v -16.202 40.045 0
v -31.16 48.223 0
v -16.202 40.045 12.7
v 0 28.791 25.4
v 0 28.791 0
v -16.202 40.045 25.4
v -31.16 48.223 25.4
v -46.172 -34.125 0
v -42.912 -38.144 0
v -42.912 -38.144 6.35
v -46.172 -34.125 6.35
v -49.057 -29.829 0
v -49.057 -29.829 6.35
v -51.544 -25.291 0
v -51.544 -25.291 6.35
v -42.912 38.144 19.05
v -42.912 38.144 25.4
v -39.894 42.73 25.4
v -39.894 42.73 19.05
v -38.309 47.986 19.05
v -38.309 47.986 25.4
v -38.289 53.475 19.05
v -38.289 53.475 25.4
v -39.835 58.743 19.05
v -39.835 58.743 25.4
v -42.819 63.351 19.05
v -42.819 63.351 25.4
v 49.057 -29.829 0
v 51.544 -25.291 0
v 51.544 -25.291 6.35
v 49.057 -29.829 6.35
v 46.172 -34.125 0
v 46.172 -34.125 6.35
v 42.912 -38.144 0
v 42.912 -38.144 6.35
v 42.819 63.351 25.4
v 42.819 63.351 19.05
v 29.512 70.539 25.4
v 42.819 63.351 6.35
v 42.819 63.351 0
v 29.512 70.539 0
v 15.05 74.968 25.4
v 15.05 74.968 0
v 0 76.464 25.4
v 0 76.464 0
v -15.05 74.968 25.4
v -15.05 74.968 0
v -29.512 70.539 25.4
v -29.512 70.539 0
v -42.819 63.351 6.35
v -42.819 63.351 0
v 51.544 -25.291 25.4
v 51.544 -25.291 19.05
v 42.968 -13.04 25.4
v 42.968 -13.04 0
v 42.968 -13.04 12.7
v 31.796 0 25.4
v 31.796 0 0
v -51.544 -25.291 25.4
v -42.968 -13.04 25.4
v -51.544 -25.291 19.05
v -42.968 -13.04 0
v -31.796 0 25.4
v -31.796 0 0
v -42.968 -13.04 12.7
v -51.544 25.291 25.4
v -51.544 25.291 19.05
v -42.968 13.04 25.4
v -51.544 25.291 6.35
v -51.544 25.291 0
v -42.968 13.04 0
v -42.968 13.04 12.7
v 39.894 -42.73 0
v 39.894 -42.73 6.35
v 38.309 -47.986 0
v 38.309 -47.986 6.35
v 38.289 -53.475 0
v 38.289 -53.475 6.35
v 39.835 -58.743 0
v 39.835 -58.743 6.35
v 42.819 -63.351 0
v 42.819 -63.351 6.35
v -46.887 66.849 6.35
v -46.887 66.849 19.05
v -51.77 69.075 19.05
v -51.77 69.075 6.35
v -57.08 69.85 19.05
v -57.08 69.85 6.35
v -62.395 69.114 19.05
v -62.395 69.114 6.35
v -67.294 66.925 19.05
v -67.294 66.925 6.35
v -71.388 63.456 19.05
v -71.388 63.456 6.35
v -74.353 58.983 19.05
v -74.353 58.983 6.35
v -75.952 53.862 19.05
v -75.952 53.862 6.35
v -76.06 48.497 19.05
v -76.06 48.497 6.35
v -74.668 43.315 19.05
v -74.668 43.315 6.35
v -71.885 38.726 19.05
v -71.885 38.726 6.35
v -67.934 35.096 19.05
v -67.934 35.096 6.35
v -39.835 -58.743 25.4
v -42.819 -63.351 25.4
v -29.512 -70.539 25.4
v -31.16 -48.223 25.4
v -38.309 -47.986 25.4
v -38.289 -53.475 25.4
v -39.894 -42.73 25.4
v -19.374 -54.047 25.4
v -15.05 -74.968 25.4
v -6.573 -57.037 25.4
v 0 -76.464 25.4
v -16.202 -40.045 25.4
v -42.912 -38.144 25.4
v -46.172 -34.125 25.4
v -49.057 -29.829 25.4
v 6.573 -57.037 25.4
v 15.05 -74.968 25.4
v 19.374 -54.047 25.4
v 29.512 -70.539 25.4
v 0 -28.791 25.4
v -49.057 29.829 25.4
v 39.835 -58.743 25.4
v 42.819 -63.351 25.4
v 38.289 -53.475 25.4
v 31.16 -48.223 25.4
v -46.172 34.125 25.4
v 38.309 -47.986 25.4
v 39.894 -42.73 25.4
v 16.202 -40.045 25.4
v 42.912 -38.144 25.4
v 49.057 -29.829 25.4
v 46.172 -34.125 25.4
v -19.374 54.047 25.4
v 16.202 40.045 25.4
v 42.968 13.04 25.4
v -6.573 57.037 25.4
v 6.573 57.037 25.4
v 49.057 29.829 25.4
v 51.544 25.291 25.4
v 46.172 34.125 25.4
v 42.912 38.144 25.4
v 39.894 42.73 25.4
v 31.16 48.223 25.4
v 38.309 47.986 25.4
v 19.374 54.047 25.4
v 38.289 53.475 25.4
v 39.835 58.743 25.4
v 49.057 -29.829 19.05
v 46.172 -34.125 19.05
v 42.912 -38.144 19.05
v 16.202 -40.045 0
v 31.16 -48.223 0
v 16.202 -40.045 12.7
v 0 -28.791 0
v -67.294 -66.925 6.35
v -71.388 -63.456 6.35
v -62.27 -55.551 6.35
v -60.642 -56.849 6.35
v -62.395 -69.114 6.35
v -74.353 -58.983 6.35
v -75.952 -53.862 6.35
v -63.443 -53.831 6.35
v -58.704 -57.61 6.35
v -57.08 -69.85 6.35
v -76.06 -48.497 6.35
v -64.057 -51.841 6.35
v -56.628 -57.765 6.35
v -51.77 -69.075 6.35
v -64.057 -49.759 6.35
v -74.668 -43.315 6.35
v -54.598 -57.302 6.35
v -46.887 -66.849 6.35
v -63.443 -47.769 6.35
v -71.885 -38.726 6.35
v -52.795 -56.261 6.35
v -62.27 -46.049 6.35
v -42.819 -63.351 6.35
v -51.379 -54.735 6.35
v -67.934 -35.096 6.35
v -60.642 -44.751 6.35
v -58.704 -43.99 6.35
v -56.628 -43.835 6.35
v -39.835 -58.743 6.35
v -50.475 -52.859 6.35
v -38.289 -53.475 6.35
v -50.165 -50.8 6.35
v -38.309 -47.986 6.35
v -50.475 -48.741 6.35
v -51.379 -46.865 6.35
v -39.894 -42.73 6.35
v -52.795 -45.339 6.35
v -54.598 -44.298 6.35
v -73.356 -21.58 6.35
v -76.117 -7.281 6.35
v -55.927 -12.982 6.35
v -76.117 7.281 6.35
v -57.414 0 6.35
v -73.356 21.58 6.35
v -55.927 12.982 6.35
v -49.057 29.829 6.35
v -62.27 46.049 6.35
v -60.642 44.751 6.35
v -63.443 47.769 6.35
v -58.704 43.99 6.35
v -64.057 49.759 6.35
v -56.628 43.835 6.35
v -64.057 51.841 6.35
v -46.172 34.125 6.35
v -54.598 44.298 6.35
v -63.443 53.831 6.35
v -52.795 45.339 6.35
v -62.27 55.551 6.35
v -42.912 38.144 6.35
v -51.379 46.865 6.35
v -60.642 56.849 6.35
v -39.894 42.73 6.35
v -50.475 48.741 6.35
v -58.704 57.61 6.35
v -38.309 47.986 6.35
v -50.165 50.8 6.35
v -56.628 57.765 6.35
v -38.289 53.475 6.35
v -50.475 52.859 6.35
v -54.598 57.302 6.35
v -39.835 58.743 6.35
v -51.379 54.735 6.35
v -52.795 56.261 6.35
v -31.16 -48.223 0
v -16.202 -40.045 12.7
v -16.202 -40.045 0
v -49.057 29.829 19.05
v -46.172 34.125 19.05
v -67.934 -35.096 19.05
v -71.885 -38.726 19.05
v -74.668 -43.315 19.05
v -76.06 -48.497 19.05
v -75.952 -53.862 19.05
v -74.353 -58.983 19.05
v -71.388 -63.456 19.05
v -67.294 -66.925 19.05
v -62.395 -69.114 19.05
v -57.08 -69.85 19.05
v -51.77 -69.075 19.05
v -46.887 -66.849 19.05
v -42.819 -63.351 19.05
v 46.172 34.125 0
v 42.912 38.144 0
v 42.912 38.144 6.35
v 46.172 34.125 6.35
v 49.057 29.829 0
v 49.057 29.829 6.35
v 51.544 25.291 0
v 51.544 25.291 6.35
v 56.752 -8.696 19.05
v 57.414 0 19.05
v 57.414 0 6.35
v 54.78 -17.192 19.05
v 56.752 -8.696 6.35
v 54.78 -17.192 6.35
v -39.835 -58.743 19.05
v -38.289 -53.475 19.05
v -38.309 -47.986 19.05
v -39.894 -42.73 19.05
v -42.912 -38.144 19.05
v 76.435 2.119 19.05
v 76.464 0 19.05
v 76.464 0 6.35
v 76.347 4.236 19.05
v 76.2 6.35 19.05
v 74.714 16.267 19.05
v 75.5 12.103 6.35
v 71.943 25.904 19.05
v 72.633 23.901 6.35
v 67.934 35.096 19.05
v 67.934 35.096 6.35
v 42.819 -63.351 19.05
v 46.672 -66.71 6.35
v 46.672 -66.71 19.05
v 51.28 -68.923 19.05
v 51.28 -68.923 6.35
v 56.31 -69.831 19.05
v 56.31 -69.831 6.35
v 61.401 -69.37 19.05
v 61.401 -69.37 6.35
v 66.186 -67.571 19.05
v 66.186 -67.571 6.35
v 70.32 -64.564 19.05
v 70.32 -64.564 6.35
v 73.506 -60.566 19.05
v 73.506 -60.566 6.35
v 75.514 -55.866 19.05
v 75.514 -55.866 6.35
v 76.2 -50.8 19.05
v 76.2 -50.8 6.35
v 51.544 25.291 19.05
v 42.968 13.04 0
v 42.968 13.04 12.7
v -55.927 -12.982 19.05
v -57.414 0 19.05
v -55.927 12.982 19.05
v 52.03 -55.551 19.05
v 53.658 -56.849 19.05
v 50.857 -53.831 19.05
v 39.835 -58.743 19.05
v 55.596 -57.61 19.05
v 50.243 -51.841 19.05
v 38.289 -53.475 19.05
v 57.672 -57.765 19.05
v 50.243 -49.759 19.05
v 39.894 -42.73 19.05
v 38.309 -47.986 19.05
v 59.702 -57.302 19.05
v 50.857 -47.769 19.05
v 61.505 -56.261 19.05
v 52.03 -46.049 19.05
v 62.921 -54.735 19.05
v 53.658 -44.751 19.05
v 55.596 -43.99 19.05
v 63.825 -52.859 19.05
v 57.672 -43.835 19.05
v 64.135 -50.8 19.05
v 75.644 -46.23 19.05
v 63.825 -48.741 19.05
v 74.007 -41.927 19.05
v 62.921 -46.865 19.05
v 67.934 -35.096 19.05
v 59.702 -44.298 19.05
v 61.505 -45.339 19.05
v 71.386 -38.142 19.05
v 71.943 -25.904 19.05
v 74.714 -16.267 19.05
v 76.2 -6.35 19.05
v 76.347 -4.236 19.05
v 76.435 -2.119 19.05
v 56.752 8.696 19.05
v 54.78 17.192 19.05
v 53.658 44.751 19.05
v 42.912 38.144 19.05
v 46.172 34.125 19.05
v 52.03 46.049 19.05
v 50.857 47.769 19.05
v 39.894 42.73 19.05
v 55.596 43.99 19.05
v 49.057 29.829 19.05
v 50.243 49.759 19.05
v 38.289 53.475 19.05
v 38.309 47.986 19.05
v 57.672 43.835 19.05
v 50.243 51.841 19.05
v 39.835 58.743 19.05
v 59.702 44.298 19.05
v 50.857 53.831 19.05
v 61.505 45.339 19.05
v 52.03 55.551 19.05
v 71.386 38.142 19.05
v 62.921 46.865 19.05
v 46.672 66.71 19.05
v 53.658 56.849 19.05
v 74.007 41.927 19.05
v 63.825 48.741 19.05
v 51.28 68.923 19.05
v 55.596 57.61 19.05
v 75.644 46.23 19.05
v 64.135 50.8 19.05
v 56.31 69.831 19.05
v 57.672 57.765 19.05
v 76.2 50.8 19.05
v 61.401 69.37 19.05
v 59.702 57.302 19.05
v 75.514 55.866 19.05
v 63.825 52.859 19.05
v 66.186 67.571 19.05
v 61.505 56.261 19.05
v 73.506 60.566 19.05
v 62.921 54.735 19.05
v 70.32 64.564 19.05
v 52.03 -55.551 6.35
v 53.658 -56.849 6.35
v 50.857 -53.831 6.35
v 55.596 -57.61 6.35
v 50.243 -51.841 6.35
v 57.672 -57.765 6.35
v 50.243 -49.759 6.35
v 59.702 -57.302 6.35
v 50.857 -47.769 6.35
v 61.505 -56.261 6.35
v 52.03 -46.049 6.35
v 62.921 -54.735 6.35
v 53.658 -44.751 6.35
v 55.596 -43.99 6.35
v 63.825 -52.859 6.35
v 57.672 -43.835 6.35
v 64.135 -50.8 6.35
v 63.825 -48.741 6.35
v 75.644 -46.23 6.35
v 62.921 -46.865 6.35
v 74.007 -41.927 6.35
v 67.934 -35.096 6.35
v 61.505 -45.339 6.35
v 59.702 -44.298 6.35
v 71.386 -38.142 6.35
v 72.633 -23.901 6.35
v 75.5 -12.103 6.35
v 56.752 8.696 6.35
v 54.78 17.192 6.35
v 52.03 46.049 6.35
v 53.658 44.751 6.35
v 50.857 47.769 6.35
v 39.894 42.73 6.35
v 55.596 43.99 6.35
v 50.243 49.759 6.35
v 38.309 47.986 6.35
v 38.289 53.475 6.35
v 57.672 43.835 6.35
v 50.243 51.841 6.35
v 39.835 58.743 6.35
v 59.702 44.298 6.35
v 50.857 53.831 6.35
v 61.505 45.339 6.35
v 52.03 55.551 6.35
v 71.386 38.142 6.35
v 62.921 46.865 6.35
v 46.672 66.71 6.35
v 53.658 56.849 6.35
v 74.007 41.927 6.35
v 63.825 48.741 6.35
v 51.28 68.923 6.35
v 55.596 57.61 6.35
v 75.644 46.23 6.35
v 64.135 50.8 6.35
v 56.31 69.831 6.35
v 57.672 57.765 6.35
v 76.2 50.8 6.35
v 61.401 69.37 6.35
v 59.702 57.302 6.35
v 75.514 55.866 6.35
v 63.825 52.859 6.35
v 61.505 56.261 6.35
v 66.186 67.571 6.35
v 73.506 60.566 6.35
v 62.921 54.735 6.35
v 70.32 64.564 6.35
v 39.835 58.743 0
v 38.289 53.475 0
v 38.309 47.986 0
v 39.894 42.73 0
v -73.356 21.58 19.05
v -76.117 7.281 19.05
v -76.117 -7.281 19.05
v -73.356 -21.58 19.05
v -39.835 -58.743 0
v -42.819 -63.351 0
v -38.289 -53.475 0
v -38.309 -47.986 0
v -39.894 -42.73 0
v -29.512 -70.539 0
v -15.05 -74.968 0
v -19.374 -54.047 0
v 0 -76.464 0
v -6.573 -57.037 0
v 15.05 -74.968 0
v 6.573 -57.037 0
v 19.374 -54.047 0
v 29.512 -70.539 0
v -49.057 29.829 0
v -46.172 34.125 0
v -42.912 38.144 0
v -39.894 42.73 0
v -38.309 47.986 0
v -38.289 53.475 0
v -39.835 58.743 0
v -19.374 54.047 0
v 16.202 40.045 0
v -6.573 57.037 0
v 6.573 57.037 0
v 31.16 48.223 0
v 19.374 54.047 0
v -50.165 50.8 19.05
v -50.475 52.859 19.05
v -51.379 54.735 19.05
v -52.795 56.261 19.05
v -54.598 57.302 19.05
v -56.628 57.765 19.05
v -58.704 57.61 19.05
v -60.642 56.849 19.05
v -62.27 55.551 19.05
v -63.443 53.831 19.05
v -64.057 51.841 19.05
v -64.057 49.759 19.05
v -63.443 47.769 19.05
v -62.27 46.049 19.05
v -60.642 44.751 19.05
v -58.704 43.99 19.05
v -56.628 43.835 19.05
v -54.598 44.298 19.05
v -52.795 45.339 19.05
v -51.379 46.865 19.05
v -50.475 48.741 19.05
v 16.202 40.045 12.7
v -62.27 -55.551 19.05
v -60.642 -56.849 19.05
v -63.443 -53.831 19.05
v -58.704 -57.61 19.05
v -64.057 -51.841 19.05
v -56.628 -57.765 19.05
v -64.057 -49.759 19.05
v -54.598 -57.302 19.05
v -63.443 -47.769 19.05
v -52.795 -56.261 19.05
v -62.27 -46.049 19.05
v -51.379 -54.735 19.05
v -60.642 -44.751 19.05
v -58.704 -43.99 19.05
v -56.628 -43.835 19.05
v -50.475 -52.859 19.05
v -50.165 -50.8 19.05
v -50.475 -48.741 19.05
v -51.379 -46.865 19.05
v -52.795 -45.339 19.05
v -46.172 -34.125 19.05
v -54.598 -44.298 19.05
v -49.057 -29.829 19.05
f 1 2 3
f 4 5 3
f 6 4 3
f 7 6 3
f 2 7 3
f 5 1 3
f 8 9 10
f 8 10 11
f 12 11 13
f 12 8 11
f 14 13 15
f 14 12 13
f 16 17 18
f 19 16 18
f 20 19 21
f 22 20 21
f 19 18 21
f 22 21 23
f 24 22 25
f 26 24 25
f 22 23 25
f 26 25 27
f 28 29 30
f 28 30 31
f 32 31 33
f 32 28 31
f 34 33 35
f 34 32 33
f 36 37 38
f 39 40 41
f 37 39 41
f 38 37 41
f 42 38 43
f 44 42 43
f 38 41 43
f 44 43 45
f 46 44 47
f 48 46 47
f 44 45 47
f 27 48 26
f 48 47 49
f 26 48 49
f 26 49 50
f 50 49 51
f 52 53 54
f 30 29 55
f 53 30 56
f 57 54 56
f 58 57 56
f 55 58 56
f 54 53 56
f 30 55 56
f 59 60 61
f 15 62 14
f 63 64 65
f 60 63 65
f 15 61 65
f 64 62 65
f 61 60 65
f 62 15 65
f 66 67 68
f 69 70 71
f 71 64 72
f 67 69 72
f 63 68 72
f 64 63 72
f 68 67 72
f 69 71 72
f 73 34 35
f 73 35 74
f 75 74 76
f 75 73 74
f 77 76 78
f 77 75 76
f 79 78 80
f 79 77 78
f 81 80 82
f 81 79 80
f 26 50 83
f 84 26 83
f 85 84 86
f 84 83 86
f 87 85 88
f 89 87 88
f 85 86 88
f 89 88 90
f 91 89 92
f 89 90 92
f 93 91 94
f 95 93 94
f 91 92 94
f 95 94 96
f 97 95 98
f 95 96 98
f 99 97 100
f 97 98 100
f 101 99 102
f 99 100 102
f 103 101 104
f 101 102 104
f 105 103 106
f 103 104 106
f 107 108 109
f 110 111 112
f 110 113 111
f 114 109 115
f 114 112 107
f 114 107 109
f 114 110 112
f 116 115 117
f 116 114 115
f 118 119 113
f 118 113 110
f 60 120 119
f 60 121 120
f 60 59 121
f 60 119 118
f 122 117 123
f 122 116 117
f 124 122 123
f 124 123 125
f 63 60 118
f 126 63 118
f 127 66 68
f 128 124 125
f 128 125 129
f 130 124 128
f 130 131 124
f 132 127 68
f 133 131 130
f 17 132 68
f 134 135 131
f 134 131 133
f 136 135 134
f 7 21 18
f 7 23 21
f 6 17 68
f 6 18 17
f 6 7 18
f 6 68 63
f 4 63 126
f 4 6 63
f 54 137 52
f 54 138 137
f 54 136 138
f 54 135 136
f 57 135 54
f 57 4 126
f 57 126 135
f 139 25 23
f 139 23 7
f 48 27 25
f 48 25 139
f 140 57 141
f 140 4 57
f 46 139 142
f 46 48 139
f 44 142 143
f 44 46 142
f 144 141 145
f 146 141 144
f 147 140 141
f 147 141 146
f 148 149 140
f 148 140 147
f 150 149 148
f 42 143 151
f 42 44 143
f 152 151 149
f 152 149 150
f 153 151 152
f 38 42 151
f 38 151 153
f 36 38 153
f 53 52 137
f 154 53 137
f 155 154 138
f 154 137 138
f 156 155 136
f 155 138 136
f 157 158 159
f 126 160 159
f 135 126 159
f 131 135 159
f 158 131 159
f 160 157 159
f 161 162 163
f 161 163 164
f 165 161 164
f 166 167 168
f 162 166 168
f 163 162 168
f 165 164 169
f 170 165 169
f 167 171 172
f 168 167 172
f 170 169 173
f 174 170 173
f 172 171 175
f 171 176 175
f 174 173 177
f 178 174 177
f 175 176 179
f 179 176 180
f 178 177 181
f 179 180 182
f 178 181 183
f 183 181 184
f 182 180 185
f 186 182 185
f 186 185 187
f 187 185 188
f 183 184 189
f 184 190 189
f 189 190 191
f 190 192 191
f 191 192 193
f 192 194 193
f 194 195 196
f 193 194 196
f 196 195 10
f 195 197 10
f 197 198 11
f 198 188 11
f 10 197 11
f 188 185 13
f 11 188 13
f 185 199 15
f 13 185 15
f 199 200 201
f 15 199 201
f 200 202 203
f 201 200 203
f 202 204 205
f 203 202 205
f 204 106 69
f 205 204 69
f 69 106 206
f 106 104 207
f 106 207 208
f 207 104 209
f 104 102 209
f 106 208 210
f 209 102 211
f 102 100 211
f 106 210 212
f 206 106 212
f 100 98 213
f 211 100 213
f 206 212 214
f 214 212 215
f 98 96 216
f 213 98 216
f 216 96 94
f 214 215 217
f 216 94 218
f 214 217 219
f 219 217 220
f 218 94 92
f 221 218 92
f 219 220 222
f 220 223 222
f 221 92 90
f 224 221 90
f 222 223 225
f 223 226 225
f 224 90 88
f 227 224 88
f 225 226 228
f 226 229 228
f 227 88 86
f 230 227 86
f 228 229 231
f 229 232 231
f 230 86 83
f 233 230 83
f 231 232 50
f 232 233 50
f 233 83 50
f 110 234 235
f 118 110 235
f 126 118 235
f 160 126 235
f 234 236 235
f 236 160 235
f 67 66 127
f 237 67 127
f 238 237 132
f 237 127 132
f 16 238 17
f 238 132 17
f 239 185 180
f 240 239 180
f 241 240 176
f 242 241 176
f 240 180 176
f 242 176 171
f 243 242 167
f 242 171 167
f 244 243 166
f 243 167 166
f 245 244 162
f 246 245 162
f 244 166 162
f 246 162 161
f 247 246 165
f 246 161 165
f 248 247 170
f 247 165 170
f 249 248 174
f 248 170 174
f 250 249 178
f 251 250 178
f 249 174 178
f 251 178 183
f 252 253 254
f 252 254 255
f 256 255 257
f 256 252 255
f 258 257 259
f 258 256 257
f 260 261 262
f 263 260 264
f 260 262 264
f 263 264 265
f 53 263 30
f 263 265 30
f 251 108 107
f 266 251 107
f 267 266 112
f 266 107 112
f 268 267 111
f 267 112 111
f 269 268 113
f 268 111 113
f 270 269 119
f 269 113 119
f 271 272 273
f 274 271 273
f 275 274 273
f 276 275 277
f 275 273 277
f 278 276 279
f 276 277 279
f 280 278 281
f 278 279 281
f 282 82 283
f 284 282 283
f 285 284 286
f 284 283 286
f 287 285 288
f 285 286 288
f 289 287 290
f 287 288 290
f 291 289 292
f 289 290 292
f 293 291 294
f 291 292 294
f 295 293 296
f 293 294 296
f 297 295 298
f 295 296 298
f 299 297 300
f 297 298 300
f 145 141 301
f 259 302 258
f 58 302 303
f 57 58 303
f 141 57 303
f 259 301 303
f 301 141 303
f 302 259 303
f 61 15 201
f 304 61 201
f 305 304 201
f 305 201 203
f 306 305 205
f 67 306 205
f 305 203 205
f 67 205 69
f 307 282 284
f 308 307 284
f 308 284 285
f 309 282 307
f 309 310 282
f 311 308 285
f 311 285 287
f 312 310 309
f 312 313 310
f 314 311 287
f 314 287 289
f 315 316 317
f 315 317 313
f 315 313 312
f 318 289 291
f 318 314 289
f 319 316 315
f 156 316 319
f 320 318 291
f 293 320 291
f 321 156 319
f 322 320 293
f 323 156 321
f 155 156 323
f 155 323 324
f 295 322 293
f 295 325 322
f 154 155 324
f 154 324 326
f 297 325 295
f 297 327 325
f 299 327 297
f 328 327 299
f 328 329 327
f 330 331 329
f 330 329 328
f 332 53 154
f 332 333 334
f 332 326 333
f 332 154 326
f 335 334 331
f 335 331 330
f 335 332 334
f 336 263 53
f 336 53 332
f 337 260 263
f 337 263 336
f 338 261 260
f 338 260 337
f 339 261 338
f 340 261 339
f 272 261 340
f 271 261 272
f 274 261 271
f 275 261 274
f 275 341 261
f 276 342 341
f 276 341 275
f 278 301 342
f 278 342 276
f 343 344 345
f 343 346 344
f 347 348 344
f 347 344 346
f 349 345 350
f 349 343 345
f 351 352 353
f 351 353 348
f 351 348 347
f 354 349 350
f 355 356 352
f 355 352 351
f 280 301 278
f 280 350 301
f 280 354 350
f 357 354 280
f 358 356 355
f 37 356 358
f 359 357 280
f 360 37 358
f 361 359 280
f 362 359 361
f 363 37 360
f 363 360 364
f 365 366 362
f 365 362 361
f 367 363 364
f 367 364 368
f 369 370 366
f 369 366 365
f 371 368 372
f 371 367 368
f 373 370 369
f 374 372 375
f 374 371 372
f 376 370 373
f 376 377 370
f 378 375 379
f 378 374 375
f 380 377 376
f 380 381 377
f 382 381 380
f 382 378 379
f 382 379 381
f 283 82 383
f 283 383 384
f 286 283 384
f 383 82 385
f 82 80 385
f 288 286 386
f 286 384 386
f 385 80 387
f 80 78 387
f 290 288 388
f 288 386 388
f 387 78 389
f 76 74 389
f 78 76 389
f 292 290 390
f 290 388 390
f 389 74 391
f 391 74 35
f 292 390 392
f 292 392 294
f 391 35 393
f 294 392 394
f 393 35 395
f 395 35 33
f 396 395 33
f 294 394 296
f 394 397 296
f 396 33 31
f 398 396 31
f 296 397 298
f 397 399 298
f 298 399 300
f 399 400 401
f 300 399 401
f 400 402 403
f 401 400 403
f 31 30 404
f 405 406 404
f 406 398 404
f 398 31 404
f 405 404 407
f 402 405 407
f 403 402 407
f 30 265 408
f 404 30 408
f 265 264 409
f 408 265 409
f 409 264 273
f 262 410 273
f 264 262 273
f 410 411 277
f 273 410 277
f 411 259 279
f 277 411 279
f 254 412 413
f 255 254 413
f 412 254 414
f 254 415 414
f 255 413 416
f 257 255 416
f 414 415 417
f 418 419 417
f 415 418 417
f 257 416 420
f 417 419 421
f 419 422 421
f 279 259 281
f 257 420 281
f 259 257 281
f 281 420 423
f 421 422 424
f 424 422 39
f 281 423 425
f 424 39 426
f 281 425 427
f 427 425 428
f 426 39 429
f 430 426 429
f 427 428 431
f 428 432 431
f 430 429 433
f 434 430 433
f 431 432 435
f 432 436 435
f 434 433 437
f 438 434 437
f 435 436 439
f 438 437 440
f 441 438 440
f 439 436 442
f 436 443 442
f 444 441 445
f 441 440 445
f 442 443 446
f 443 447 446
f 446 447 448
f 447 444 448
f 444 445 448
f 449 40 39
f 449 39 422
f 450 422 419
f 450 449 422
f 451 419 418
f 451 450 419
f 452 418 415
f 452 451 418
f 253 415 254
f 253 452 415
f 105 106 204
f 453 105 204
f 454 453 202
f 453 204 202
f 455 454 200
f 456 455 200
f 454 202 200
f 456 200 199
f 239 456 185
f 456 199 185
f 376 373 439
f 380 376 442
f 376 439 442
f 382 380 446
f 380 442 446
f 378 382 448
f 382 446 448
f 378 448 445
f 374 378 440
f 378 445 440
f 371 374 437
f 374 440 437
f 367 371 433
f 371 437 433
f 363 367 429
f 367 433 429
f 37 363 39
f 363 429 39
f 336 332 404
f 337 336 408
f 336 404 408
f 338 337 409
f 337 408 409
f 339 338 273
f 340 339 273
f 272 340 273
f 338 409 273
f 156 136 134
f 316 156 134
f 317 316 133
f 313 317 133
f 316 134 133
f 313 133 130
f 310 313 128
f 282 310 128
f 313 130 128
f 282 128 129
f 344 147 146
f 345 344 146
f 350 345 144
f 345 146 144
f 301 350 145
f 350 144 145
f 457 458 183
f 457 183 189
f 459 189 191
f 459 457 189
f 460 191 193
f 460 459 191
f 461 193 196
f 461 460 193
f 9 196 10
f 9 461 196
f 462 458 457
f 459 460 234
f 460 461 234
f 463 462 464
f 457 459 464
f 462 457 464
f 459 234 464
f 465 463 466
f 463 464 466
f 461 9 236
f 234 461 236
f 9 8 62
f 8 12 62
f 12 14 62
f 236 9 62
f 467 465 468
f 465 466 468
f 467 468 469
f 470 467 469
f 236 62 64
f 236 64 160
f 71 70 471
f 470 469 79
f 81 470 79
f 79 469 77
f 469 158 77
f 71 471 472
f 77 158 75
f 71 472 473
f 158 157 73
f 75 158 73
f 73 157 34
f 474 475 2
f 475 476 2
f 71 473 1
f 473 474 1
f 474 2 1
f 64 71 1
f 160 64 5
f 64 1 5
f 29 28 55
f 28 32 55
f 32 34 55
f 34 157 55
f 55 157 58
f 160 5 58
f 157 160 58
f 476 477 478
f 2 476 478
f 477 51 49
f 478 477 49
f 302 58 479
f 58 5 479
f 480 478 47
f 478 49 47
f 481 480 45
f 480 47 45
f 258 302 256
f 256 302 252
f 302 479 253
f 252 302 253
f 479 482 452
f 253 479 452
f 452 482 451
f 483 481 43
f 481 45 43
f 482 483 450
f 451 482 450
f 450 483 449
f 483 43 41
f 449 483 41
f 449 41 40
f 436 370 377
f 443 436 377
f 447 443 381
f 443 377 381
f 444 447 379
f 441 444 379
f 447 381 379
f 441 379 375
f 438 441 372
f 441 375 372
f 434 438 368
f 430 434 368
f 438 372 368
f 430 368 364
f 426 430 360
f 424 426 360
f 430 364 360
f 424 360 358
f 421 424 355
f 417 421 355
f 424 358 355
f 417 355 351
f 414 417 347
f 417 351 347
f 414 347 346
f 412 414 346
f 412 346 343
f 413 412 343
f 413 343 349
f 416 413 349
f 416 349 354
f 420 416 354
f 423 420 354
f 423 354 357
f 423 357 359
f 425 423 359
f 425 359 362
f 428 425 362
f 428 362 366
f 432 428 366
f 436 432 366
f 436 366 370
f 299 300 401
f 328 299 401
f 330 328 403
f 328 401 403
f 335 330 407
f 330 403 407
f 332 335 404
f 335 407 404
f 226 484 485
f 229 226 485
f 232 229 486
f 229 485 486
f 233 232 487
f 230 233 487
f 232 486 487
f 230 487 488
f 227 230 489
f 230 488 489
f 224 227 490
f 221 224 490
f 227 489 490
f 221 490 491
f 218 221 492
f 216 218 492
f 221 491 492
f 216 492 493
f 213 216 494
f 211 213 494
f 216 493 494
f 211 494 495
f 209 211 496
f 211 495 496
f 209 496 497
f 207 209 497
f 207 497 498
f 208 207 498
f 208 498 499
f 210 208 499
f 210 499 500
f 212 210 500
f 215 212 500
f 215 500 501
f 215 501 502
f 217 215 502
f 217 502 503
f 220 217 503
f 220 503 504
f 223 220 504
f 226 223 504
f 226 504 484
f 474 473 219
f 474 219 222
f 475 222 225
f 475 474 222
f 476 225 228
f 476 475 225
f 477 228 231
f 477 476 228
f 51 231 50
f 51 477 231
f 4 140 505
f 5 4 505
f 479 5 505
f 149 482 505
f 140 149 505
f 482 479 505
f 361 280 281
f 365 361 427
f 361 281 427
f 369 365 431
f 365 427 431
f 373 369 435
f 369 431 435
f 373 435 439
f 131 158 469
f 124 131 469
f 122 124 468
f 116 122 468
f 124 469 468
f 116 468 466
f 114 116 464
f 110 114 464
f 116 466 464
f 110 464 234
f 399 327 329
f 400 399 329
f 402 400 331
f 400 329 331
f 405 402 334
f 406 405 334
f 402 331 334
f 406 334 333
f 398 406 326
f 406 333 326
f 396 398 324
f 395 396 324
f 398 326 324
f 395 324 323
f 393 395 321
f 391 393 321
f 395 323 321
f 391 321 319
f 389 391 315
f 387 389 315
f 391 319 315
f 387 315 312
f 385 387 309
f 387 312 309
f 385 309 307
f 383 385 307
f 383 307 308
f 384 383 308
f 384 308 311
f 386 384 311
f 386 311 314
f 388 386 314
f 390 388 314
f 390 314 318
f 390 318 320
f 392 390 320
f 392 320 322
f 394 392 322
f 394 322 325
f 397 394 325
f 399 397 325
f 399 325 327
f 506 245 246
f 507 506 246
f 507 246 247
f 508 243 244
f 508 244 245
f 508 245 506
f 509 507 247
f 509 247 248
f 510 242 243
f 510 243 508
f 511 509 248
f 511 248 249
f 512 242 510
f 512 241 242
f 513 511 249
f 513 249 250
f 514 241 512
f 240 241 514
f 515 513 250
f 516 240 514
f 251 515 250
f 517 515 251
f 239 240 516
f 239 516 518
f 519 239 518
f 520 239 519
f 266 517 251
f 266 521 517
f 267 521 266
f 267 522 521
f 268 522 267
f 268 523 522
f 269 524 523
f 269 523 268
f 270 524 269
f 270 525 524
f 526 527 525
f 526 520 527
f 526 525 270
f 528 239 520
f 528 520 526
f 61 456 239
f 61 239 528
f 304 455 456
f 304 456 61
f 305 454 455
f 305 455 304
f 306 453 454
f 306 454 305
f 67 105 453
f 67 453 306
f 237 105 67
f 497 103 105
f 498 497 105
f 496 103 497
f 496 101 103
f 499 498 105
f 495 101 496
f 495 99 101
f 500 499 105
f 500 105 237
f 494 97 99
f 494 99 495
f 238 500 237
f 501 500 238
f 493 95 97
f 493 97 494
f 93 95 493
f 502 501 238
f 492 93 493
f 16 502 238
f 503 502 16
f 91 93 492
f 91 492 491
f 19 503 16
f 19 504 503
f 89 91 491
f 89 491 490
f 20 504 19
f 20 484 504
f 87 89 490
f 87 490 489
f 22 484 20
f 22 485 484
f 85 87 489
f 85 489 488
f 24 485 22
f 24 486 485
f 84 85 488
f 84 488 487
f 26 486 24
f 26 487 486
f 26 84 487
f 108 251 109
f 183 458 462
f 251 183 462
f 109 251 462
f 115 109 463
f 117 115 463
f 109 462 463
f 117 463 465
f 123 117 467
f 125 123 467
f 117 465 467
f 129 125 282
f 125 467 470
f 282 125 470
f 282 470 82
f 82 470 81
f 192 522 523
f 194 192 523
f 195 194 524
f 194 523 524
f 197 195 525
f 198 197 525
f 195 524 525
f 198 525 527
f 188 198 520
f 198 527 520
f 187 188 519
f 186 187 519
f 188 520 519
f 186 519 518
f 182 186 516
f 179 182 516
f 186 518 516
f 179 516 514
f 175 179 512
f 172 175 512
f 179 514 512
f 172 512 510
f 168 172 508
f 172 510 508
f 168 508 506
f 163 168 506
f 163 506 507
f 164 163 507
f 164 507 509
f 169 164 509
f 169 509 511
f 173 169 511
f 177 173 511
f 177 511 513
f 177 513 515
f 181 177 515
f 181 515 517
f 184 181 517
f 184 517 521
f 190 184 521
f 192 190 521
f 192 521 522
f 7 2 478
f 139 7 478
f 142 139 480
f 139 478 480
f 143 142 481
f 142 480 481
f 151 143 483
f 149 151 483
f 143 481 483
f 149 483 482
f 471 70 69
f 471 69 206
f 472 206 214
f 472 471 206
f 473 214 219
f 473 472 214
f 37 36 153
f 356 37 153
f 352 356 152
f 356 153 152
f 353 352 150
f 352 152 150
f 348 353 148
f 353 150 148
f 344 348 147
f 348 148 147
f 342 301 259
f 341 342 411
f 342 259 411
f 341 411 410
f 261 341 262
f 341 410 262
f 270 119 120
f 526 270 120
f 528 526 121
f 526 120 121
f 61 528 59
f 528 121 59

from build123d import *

# Parameters (mm, degrees)
F1_DEPTH = 25.4
F2_R     = 6.985
F3_DEPTH = 25.4
F4_R     = 6.985
F5_DEPTH = 6.35
F7_DEPTH = 6.35


with BuildPart() as f1:
    # F0 (on Top) → F1 (new body)
    with BuildSketch(Plane.XY):
        with BuildLine():
            ThreePointArc((-57.1499998878, 50.8000001262), (-50.3767956165, 57.5233949226), (-42.8188262114, 63.3506955122))
            ThreePointArc((-42.8188262114, 63.3506955122), (-71.3881475209, 63.4561311297), (-67.9339324093, 35.0962010395))
            ThreePointArc((-67.9339324093, 35.0962010395), (-63.0329267619, 43.2852474156), (-57.1499998878, 50.8000001262))
        make_face()
        with BuildLine():
            ThreePointArc((38.1017176106, 51.0558085491), (39.3641043227, 57.6238123477), (42.8188262114, 63.3506955122))
            ThreePointArc((42.8188262114, 63.3506955122), (0, 76.4641255753), (-42.8188262114, 63.3506955122))
            ThreePointArc((-42.8188262114, 63.3506955122), (-39.3641043227, 57.6238123477), (-38.1017176106, 51.0558085491))
            add(Edge.make_bspline(
                [(-31.1596419842, 48.223008274), (-34.8147724634, 49.9032857332), (-38.1017176106, 51.0558085491)],
                knots=[2.3797469471, 2.3797469471, 2.3797469471, 2.5253095942, 2.5253095942, 2.5253095942], degree=2, weights=[1, 0.9973526084, 1]))
            ThreePointArc((-31.1596419842, 48.223008274), (0, 57.4141255753), (31.1596419842, 48.223008274))
            add(Edge.make_bspline(
                [(38.1017176106, 51.0558085491), (34.8147724634, 49.9032857332), (31.1596419842, 48.223008274)],
                knots=[0.6162830594, 0.6162830594, 0.6162830594, 0.7618457065, 0.7618457065, 0.7618457065], degree=2, weights=[1, 0.9973526084, 1]))
        make_face()
        with BuildLine():
            ThreePointArc((67.9339324093, 35.0962010395), (74.0072894084, 41.9267653135), (76.2, 50.8))
            ThreePointArc((76.2, 50.8), (63.8542389324, 68.6313117952), (42.8188262114, 63.3506955122))
            ThreePointArc((42.8188262114, 63.3506955122), (50.37679568, 57.523394867), (57.15, 50.8))
            ThreePointArc((57.15, 50.8), (63.0329268097, 43.285247346), (67.9339324093, 35.0962010395))
        make_face()
        with BuildLine():
            ThreePointArc((55.1707974514, 31.8530937282), (61.8415086314, 32.3367325004), (67.9339324093, 35.0962010395))
            ThreePointArc((67.9339324093, 35.0962010395), (63.0329268097, 43.285247346), (57.15, 50.8))
            add(Edge.make_bspline(
                [(55.1707974514, 31.8530937282), (61.8495524076, 45.5130035415), (57.15, 50.8)],
                knots=[5.6669022478, 5.6669022478, 5.6669022478, 6.2831853072, 6.2831853072, 6.2831853072], degree=2, weights=[1, 0.9528988673, 1]))
        make_face()
        with BuildLine():
            ThreePointArc((57.15, 50.8), (50.37679568, 57.523394867), (42.8188262114, 63.3506955122))
            ThreePointArc((42.8188262114, 63.3506955122), (39.3641043227, 57.6238123477), (38.1017176106, 51.0558085491))
            add(Edge.make_bspline(
                [(57.15, 50.8), (52.4504475924, 56.0869964585), (38.1017176106, 51.0558085491)],
                knots=[0, 0, 0, 0.6162830594, 0.6162830594, 0.6162830594], degree=2, weights=[1, 0.9528988673, 1]))
        make_face()
        with BuildLine():
            ThreePointArc((42.9118518288, 38.1438696019), (39.2984970742, 44.1497110372), (38.1017176106, 51.0558085491))
            add(Edge.make_bspline(
                [(38.1017176106, 51.0558085491), (34.8147724634, 49.9032857332), (31.1596419842, 48.223008274)],
                knots=[0.6162830594, 0.6162830594, 0.6162830594, 0.7618457065, 0.7618457065, 0.7618457065], degree=2, weights=[1, 0.9973526084, 1]))
            ThreePointArc((31.1596419842, 48.223008274), (37.3770492149, 43.5813951999), (42.9118518288, 38.1438696019))
        make_face()
        with BuildLine():
            ThreePointArc((-38.1017176106, 51.0558085491), (-39.3641043227, 57.6238123477), (-42.8188262114, 63.3506955122))
            ThreePointArc((-42.8188262114, 63.3506955122), (-50.3767956165, 57.5233949226), (-57.1499998878, 50.8000001262))
            add(Edge.make_bspline(
                [(-38.1017176106, 51.0558085491), (-52.4504474039, 56.0869963924), (-57.1499998878, 50.8000001262)],
                knots=[2.5253095942, 2.5253095942, 2.5253095942, 3.141592646, 3.141592646, 3.141592646], degree=2, weights=[1, 0.9528988685, 1]))
        make_face()
        with BuildLine():
            add(Edge.make_bspline(
                [(-31.1596419842, 48.223008274), (-34.8147724634, 49.9032857332), (-38.1017176106, 51.0558085491)],
                knots=[2.3797469471, 2.3797469471, 2.3797469471, 2.5253095942, 2.5253095942, 2.5253095942], degree=2, weights=[1, 0.9973526084, 1]))
            ThreePointArc((-38.1017176106, 51.0558085491), (-38.1004294075, 50.9279071577), (-38.1, 50.8))
            ThreePointArc((-38.1, 50.8), (-39.34355171, 44.030000052), (-42.9118529445, 38.1438683467))
            ThreePointArc((-42.9118529445, 38.1438683467), (-37.3770498523, 43.5813946532), (-31.1596419842, 48.223008274))
        make_face()
        with BuildLine():
            ThreePointArc((-38.1, 50.8), (-38.1004294075, 50.9279071577), (-38.1017176106, 51.0558085491))
            add(Edge.make_bspline(
                [(-38.1017176106, 51.0558085491), (-52.4504474039, 56.0869963924), (-57.1499998878, 50.8000001262)],
                knots=[2.5253095942, 2.5253095942, 2.5253095942, 3.141592646, 3.141592646, 3.141592646], degree=2, weights=[1, 0.9528988685, 1]))
            add(Edge.make_bspline(
                [(-57.1499998878, 50.8000001262), (-61.8495524953, 45.513003721), (-55.1707974514, 31.8530937282)],
                knots=[3.141592646, 3.141592646, 3.141592646, 3.757875713, 3.757875713, 3.757875713], degree=2, weights=[1, 0.9528988662, 1]))
            ThreePointArc((-55.1707974514, 31.8530937282), (-48.4526401494, 33.8513000018), (-42.9118529445, 38.1438683467))
            ThreePointArc((-42.9118529445, 38.1438683467), (-39.34355171, 44.030000052), (-38.1, 50.8))
        make_face()
        with BuildLine():
            ThreePointArc((-57.1499998878, 50.8000001262), (-63.0329267619, 43.2852474156), (-67.9339324093, 35.0962010395))
            ThreePointArc((-67.9339324093, 35.0962010395), (-61.8415086314, 32.3367325004), (-55.1707974514, 31.8530937282))
            add(Edge.make_bspline(
                [(-57.1499998878, 50.8000001262), (-61.8495524953, 45.513003721), (-55.1707974514, 31.8530937282)],
                knots=[3.141592646, 3.141592646, 3.141592646, 3.757875713, 3.757875713, 3.757875713], degree=2, weights=[1, 0.9528988662, 1]))
        make_face()
        with BuildLine():
            ThreePointArc((-42.9118529445, 38.1438683467), (-48.4526401494, 33.8513000018), (-55.1707974514, 31.8530937282))
            add(Edge.make_bspline(
                [(-55.1707974514, 31.8530937282), (-53.6408570859, 28.7239405328), (-51.5436352082, 25.291015897)],
                knots=[3.757875713, 3.757875713, 3.757875713, 3.9034383601, 3.9034383601, 3.9034383601], degree=2, weights=[1, 0.9973526084, 1]))
            ThreePointArc((-51.5436352082, 25.291015897), (-47.6629705806, 32.0097336917), (-42.9118529445, 38.1438683467))
        make_face()
        with BuildLine():
            ThreePointArc((-55.1707974514, 31.8530937282), (-61.8415086314, 32.3367325004), (-67.9339324093, 35.0962010395))
            ThreePointArc((-67.9339324093, 35.0962010395), (-76.4641255753, 0), (-67.9339324093, -35.0962010395))
            ThreePointArc((-67.9339324093, -35.0962010395), (-61.8415086314, -32.3367325004), (-55.1707974514, -31.8530937282))
            add(Edge.make_bspline(
                [(-51.5436352082, -25.291015897), (-53.6408570859, -28.7239405328), (-55.1707974514, -31.8530937282)],
                knots=[2.3797469471, 2.3797469471, 2.3797469471, 2.5253095942, 2.5253095942, 2.5253095942], degree=2, weights=[1, 0.9973526084, 1]))
            ThreePointArc((-51.5436352082, -25.291015897), (-57.4141255753, 0), (-51.5436352082, 25.291015897))
            add(Edge.make_bspline(
                [(-55.1707974514, 31.8530937282), (-53.6408570859, 28.7239405328), (-51.5436352082, 25.291015897)],
                knots=[3.757875713, 3.757875713, 3.757875713, 3.9034383601, 3.9034383601, 3.9034383601], degree=2, weights=[1, 0.9973526084, 1]))
        make_face()
        with BuildLine():
            ThreePointArc((-42.9118518976, -38.1438695245), (-48.4526394484, -33.8513003615), (-55.1707974514, -31.8530937282))
            add(Edge.make_bspline(
                [(-55.1707974514, -31.8530937282), (-61.8495523114, -45.5130033448), (-57.1500001229, -50.7999998618)],
                knots=[2.5253095942, 2.5253095942, 2.5253095942, 3.1415926453, 3.1415926453, 3.1415926453], degree=2, weights=[1, 0.9528988686, 1]))
            add(Edge.make_bspline(
                [(-57.1500001229, -50.7999998618), (-52.450447799, -56.0869965309), (-38.1017176106, -51.0558085491)],
                knots=[3.1415926453, 3.1415926453, 3.1415926453, 3.757875713, 3.757875713, 3.757875713], degree=2, weights=[1, 0.9528988661, 1]))
            ThreePointArc((-38.1017176106, -51.0558085491), (-38.1004294075, -50.9279071577), (-38.1, -50.8))
            ThreePointArc((-38.1, -50.8), (-39.34355143, -44.0300007885), (-42.9118518976, -38.1438695245))
        make_face()
        with BuildLine():
            ThreePointArc((-55.1707974514, -31.8530937282), (-61.8415086314, -32.3367325004), (-67.9339324093, -35.0962010395))
            ThreePointArc((-67.9339324093, -35.0962010395), (-63.032926862, -43.2852472698), (-57.1500001229, -50.7999998618))
            add(Edge.make_bspline(
                [(-55.1707974514, -31.8530937282), (-61.8495523114, -45.5130033448), (-57.1500001229, -50.7999998618)],
                knots=[2.5253095942, 2.5253095942, 2.5253095942, 3.1415926453, 3.1415926453, 3.1415926453], degree=2, weights=[1, 0.9528988686, 1]))
        make_face()
        with BuildLine():
            ThreePointArc((-57.1500001229, -50.7999998618), (-63.032926862, -43.2852472698), (-67.9339324093, -35.0962010395))
            ThreePointArc((-67.9339324093, -35.0962010395), (-71.3881475209, -63.4561311297), (-42.8188262114, -63.3506955122))
            ThreePointArc((-42.8188262114, -63.3506955122), (-50.3767957495, -57.523394806), (-57.1500001229, -50.7999998618))
        make_face()
        with BuildLine():
            ThreePointArc((-57.1500001229, -50.7999998618), (-50.3767957495, -57.523394806), (-42.8188262114, -63.3506955122))
            ThreePointArc((-42.8188262114, -63.3506955122), (-39.3641043227, -57.6238123477), (-38.1017176106, -51.0558085491))
            add(Edge.make_bspline(
                [(-57.1500001229, -50.7999998618), (-52.450447799, -56.0869965309), (-38.1017176106, -51.0558085491)],
                knots=[3.1415926453, 3.1415926453, 3.1415926453, 3.757875713, 3.757875713, 3.757875713], degree=2, weights=[1, 0.9528988661, 1]))
        make_face()
        with BuildLine():
            ThreePointArc((76.2, -50.8), (74.0072894084, -41.9267653135), (67.9339324093, -35.0962010395))
            ThreePointArc((67.9339324093, -35.0962010395), (63.0329268097, -43.285247346), (57.15, -50.8))
            ThreePointArc((57.15, -50.8), (50.37679568, -57.523394867), (42.8188262114, -63.3506955122))
            ThreePointArc((42.8188262114, -63.3506955122), (63.8542389324, -68.6313117952), (76.2, -50.8))
        make_face()
        with BuildLine():
            ThreePointArc((42.8188262114, -63.3506955122), (50.37679568, -57.523394867), (57.15, -50.8))
            add(Edge.make_bspline(
                [(38.1017176106, -51.0558085491), (52.4504475924, -56.0869964585), (57.15, -50.8)],
                knots=[5.6669022478, 5.6669022478, 5.6669022478, 6.2831853072, 6.2831853072, 6.2831853072], degree=2, weights=[1, 0.9528988673, 1]))
            ThreePointArc((38.1017176106, -51.0558085491), (39.3641043227, -57.6238123477), (42.8188262114, -63.3506955122))
        make_face()
        with BuildLine():
            add(Edge.make_bspline(
                [(57.15, -50.8), (61.8495524076, -45.5130035415), (55.1707974514, -31.8530937282)],
                knots=[0, 0, 0, 0.6162830594, 0.6162830594, 0.6162830594], degree=2, weights=[1, 0.9528988673, 1]))
            ThreePointArc((55.1707974514, -31.8530937282), (48.4526401707, -33.8512999909), (42.9118529763, -38.1438683109))
            ThreePointArc((42.9118529763, -38.1438683109), (39.2984973756, -44.1497102279), (38.1017176106, -51.0558085491))
            add(Edge.make_bspline(
                [(38.1017176106, -51.0558085491), (52.4504475924, -56.0869964585), (57.15, -50.8)],
                knots=[5.6669022478, 5.6669022478, 5.6669022478, 6.2831853072, 6.2831853072, 6.2831853072], degree=2, weights=[1, 0.9528988673, 1]))
        make_face()
        with BuildLine():
            ThreePointArc((42.9118529763, -38.1438683109), (48.4526401707, -33.8512999909), (55.1707974514, -31.8530937282))
            add(Edge.make_bspline(
                [(55.1707974514, -31.8530937282), (53.6408570859, -28.7239405328), (51.5436352082, -25.291015897)],
                knots=[0.6162830594, 0.6162830594, 0.6162830594, 0.7618457065, 0.7618457065, 0.7618457065], degree=2, weights=[1, 0.9973526084, 1]))
            ThreePointArc((51.5436352082, -25.291015897), (47.6629705939, -32.0097336719), (42.9118529763, -38.1438683109))
        make_face()
        with BuildLine():
            ThreePointArc((76.4641255753, 0), (74.3009799349, 18.0589833799), (67.9339324093, 35.0962010395))
            ThreePointArc((67.9339324093, 35.0962010395), (61.8415086314, 32.3367325004), (55.1707974514, 31.8530937282))
            add(Edge.make_bspline(
                [(51.5436352082, 25.291015897), (53.6408570859, 28.7239405328), (55.1707974514, 31.8530937282)],
                knots=[5.5213396007, 5.5213396007, 5.5213396007, 5.6669022478, 5.6669022478, 5.6669022478], degree=2, weights=[1, 0.9973526084, 1]))
            ThreePointArc((51.5436352082, 25.291015897), (55.9272498878, 12.9817000259), (57.4141255753, 0))
            ThreePointArc((57.4141255753, 0), (55.9272498878, -12.9817000259), (51.5436352082, -25.291015897))
            add(Edge.make_bspline(
                [(55.1707974514, -31.8530937282), (53.6408570859, -28.7239405328), (51.5436352082, -25.291015897)],
                knots=[0.6162830594, 0.6162830594, 0.6162830594, 0.7618457065, 0.7618457065, 0.7618457065], degree=2, weights=[1, 0.9973526084, 1]))
            ThreePointArc((55.1707974514, -31.8530937282), (61.8415086314, -32.3367325004), (67.9339324093, -35.0962010395))
            ThreePointArc((67.9339324093, -35.0962010395), (74.3009799349, -18.0589833799), (76.4641255753, 0))
        make_face()
        with BuildLine():
            ThreePointArc((57.15, -50.8), (63.0329268097, -43.285247346), (67.9339324093, -35.0962010395))
            ThreePointArc((67.9339324093, -35.0962010395), (61.8415086314, -32.3367325004), (55.1707974514, -31.8530937282))
            add(Edge.make_bspline(
                [(57.15, -50.8), (61.8495524076, -45.5130035415), (55.1707974514, -31.8530937282)],
                knots=[0, 0, 0, 0.6162830594, 0.6162830594, 0.6162830594], degree=2, weights=[1, 0.9528988673, 1]))
        make_face()
        with BuildLine():
            add(Edge.make_bspline(
                [(57.15, 50.8), (52.4504475924, 56.0869964585), (38.1017176106, 51.0558085491)],
                knots=[0, 0, 0, 0.6162830594, 0.6162830594, 0.6162830594], degree=2, weights=[1, 0.9528988673, 1]))
            ThreePointArc((38.1017176106, 51.0558085491), (39.2984970742, 44.1497110372), (42.9118518288, 38.1438696019))
            ThreePointArc((42.9118518288, 38.1438696019), (48.4526394023, 33.8513003852), (55.1707974514, 31.8530937282))
            add(Edge.make_bspline(
                [(55.1707974514, 31.8530937282), (61.8495524076, 45.5130035415), (57.15, 50.8)],
                knots=[5.6669022478, 5.6669022478, 5.6669022478, 6.2831853072, 6.2831853072, 6.2831853072], degree=2, weights=[1, 0.9528988673, 1]))
        make_face()
        with BuildLine():
            add(Edge.make_bspline(
                [(51.5436352082, 25.291015897), (53.6408570859, 28.7239405328), (55.1707974514, 31.8530937282)],
                knots=[5.5213396007, 5.5213396007, 5.5213396007, 5.6669022478, 5.6669022478, 5.6669022478], degree=2, weights=[1, 0.9973526084, 1]))
            ThreePointArc((55.1707974514, 31.8530937282), (48.4526394023, 33.8513003852), (42.9118518288, 38.1438696019))
            ThreePointArc((42.9118518288, 38.1438696019), (47.6629701124, 32.0097343888), (51.5436352082, 25.291015897))
        make_face()
        with BuildLine():
            ThreePointArc((-38.1017176106, -51.0558085491), (-39.3641043227, -57.6238123477), (-42.8188262114, -63.3506955122))
            ThreePointArc((-42.8188262114, -63.3506955122), (0, -76.4641255753), (42.8188262114, -63.3506955122))
            ThreePointArc((42.8188262114, -63.3506955122), (39.3641043227, -57.6238123477), (38.1017176106, -51.0558085491))
            add(Edge.make_bspline(
                [(31.1596419842, -48.223008274), (34.8147724634, -49.9032857332), (38.1017176106, -51.0558085491)],
                knots=[5.5213396007, 5.5213396007, 5.5213396007, 5.6669022478, 5.6669022478, 5.6669022478], degree=2, weights=[1, 0.9973526084, 1]))
            ThreePointArc((31.1596419842, -48.223008274), (0, -57.4141255753), (-31.1596419842, -48.223008274))
            add(Edge.make_bspline(
                [(-38.1017176106, -51.0558085491), (-34.8147724634, -49.9032857332), (-31.1596419842, -48.223008274)],
                knots=[3.757875713, 3.757875713, 3.757875713, 3.9034383601, 3.9034383601, 3.9034383601], degree=2, weights=[1, 0.9973526084, 1]))
        make_face()
        with BuildLine():
            ThreePointArc((38.1017176106, -51.0558085491), (39.2984973756, -44.1497102279), (42.9118529763, -38.1438683109))
            ThreePointArc((42.9118529763, -38.1438683109), (37.3770498705, -43.5813946376), (31.1596419842, -48.223008274))
            add(Edge.make_bspline(
                [(31.1596419842, -48.223008274), (34.8147724634, -49.9032857332), (38.1017176106, -51.0558085491)],
                knots=[5.5213396007, 5.5213396007, 5.5213396007, 5.6669022478, 5.6669022478, 5.6669022478], degree=2, weights=[1, 0.9973526084, 1]))
        make_face()
        with BuildLine():
            ThreePointArc((-31.1596419842, -48.223008274), (-37.3770492542, -43.5813951661), (-42.9118518976, -38.1438695245))
            ThreePointArc((-42.9118518976, -38.1438695245), (-39.34355143, -44.0300007885), (-38.1, -50.8))
            ThreePointArc((-38.1, -50.8), (-38.1004294075, -50.9279071577), (-38.1017176106, -51.0558085491))
            add(Edge.make_bspline(
                [(-38.1017176106, -51.0558085491), (-34.8147724634, -49.9032857332), (-31.1596419842, -48.223008274)],
                knots=[3.757875713, 3.757875713, 3.757875713, 3.9034383601, 3.9034383601, 3.9034383601], degree=2, weights=[1, 0.9973526084, 1]))
        make_face()
        with BuildLine():
            add(Edge.make_bspline(
                [(-51.5436352082, -25.291015897), (-53.6408570859, -28.7239405328), (-55.1707974514, -31.8530937282)],
                knots=[2.3797469471, 2.3797469471, 2.3797469471, 2.5253095942, 2.5253095942, 2.5253095942], degree=2, weights=[1, 0.9973526084, 1]))
            ThreePointArc((-55.1707974514, -31.8530937282), (-48.4526394484, -33.8513003615), (-42.9118518976, -38.1438695245))
            ThreePointArc((-42.9118518976, -38.1438695245), (-47.6629701413, -32.0097343458), (-51.5436352082, -25.291015897))
        make_face()
        with BuildLine():
            add(Edge.make_bspline(
                [(0, 28.7906564504), (-17.2570551039, 15.6257643854), (-31.7963289723, 0)],
                knots=[1.3179615541, 1.3179615541, 1.3179615541, 1.8868284832, 1.8868284832, 1.8868284832], degree=2, weights=[1, 0.9598207843, 1]))
            add(Edge.make_bspline(
                [(0, 28.7906564504), (-16.8493165476, 41.6444969454), (-31.1596419842, 48.223008274)],
                knots=[1.8236310995, 1.8236310995, 1.8236310995, 2.3797469471, 2.3797469471, 2.3797469471], degree=2, weights=[1, 0.9615903293, 1]))
            ThreePointArc((-31.1596419842, 48.223008274), (-37.3770498523, 43.5813946532), (-42.9118529445, 38.1438683467))
            ThreePointArc((-42.9118529445, 38.1438683467), (-47.6629705806, 32.0097336917), (-51.5436352082, 25.291015897))
            add(Edge.make_bspline(
                [(-51.5436352082, 25.291015897), (-44.3072469413, 13.4458335537), (-31.7963289723, 0)],
                knots=[3.9034383601, 3.9034383601, 3.9034383601, 4.3963568239, 4.3963568239, 4.3963568239], degree=2, weights=[1, 0.9697823463, 1]))
        make_face()
        with BuildLine():
            add(Edge.make_bspline(
                [(31.7963289723, 0), (17.2570551039, 15.6257643854), (0, 28.7906564504)],
                knots=[1.2547641704, 1.2547641704, 1.2547641704, 1.8236310995, 1.8236310995, 1.8236310995], degree=2, weights=[1, 0.9598207843, 1]))
            add(Edge.make_bspline(
                [(0, 28.7906564504), (-17.2570551039, 15.6257643854), (-31.7963289723, 0)],
                knots=[1.3179615541, 1.3179615541, 1.3179615541, 1.8868284832, 1.8868284832, 1.8868284832], degree=2, weights=[1, 0.9598207843, 1]))
            add(Edge.make_bspline(
                [(-31.7963289723, 0), (-17.2570551039, -15.6257643854), (0, -28.7906564504)],
                knots=[4.3963568239, 4.3963568239, 4.3963568239, 4.9652237531, 4.9652237531, 4.9652237531], degree=2, weights=[1, 0.9598207843, 1]))
            add(Edge.make_bspline(
                [(0, -28.7906564504), (17.2570551039, -15.6257643854), (31.7963289723, 0)],
                knots=[4.4595542076, 4.4595542076, 4.4595542076, 5.0284211368, 5.0284211368, 5.0284211368], degree=2, weights=[1, 0.9598207843, 1]))
        make_face()
        with BuildLine():
            add(Edge.make_bspline(
                [(51.5436352082, -25.291015897), (44.3072469413, -13.4458335537), (31.7963289723, 0)],
                knots=[0.7618457065, 0.7618457065, 0.7618457065, 1.2547641704, 1.2547641704, 1.2547641704], degree=2, weights=[1, 0.9697823463, 1]))
            add(Edge.make_bspline(
                [(0, -28.7906564504), (17.2570551039, -15.6257643854), (31.7963289723, 0)],
                knots=[4.4595542076, 4.4595542076, 4.4595542076, 5.0284211368, 5.0284211368, 5.0284211368], degree=2, weights=[1, 0.9598207843, 1]))
            add(Edge.make_bspline(
                [(0, -28.7906564504), (16.8493165476, -41.6444969454), (31.1596419842, -48.223008274)],
                knots=[4.9652237531, 4.9652237531, 4.9652237531, 5.5213396007, 5.5213396007, 5.5213396007], degree=2, weights=[1, 0.9615903293, 1]))
            ThreePointArc((31.1596419842, -48.223008274), (37.3770498705, -43.5813946376), (42.9118529763, -38.1438683109))
            ThreePointArc((42.9118529763, -38.1438683109), (47.6629705939, -32.0097336719), (51.5436352082, -25.291015897))
        make_face()
        with BuildLine():
            ThreePointArc((51.5436352082, 25.291015897), (47.6629701124, 32.0097343888), (42.9118518288, 38.1438696019))
            ThreePointArc((42.9118518288, 38.1438696019), (37.3770492149, 43.5813951999), (31.1596419842, 48.223008274))
            add(Edge.make_bspline(
                [(31.1596419842, 48.223008274), (16.8493165476, 41.6444969454), (0, 28.7906564504)],
                knots=[0.7618457065, 0.7618457065, 0.7618457065, 1.3179615541, 1.3179615541, 1.3179615541], degree=2, weights=[1, 0.9615903293, 1]))
            add(Edge.make_bspline(
                [(31.7963289723, 0), (17.2570551039, 15.6257643854), (0, 28.7906564504)],
                knots=[1.2547641704, 1.2547641704, 1.2547641704, 1.8236310995, 1.8236310995, 1.8236310995], degree=2, weights=[1, 0.9598207843, 1]))
            add(Edge.make_bspline(
                [(31.7963289723, 0), (44.3072469413, 13.4458335537), (51.5436352082, 25.291015897)],
                knots=[5.0284211368, 5.0284211368, 5.0284211368, 5.5213396007, 5.5213396007, 5.5213396007], degree=2, weights=[1, 0.9697823463, 1]))
        make_face()
        with BuildLine():
            add(Edge.make_bspline(
                [(-31.7963289723, 0), (-17.2570551039, -15.6257643854), (0, -28.7906564504)],
                knots=[4.3963568239, 4.3963568239, 4.3963568239, 4.9652237531, 4.9652237531, 4.9652237531], degree=2, weights=[1, 0.9598207843, 1]))
            add(Edge.make_bspline(
                [(-31.7963289723, 0), (-44.3072469413, -13.4458335537), (-51.5436352082, -25.291015897)],
                knots=[1.8868284832, 1.8868284832, 1.8868284832, 2.3797469471, 2.3797469471, 2.3797469471], degree=2, weights=[1, 0.9697823463, 1]))
            ThreePointArc((-51.5436352082, -25.291015897), (-47.6629701413, -32.0097343458), (-42.9118518976, -38.1438695245))
            ThreePointArc((-42.9118518976, -38.1438695245), (-37.3770492542, -43.5813951661), (-31.1596419842, -48.223008274))
            add(Edge.make_bspline(
                [(-31.1596419842, -48.223008274), (-16.8493165476, -41.6444969454), (0, -28.7906564504)],
                knots=[3.9034383601, 3.9034383601, 3.9034383601, 4.4595542076, 4.4595542076, 4.4595542076], degree=2, weights=[1, 0.9615903293, 1]))
        make_face()
    extrude(amount=F1_DEPTH)

    # F2 (on face) → F3 (cut)
    with BuildSketch(Plane.XY.offset(25.4)):
        with Locations((-57.15, 50.8)):
            Circle(F2_R)
        with Locations((-57.15, -50.8)):
            Circle(F2_R)
        with Locations((57.15, -50.8)):
            Circle(F2_R)
        with Locations((57.15, 50.8)):
            Circle(F2_R)
    extrude(amount=-F3_DEPTH, mode=Mode.SUBTRACT)

    # F4 (on face) → F5 (cut)
    with BuildSketch(Plane.XY.offset(25.4)):
        with BuildLine():
            ThreePointArc((-51.5436352082, 25.291015897), (-47.6629703853, 32.0097339825), (-42.9118524791, 38.1438688703))
            ThreePointArc((-42.9118524791, 38.1438688703), (-38.1001297285, 50.7296960956), (-42.8188262114, 63.3506955122))
            ThreePointArc((-42.8188262114, 63.3506955122), (-71.3881475209, 63.4561311297), (-67.9339324093, 35.0962010395))
            ThreePointArc((-67.9339324093, 35.0962010395), (-76.4641255753, 0), (-67.9339324093, -35.0962010395))
            ThreePointArc((-67.9339324093, -35.0962010395), (-71.3881475209, -63.4561311297), (-42.8188262114, -63.3506955122))
            ThreePointArc((-42.8188262114, -63.3506955122), (-38.1001297285, -50.7296960956), (-42.9118524791, -38.1438688703))
            ThreePointArc((-42.9118524791, -38.1438688703), (-47.6629703853, -32.0097339825), (-51.5436352082, -25.291015897))
            ThreePointArc((-51.5436352082, -25.291015897), (-57.4141255753, 0), (-51.5436352082, 25.291015897))
        make_face()
        with Locations((-57.15, -50.8)):
            Circle(F4_R, mode=Mode.SUBTRACT)
        with Locations((-57.15, 50.8)):
            Circle(F4_R, mode=Mode.SUBTRACT)
        with BuildLine():
            ThreePointArc((76.2, 50.8), (63.8542389324, 68.6313117952), (42.8188262114, 63.3506955122))
            ThreePointArc((42.8188262114, 63.3506955122), (38.1001297285, 50.7296960956), (42.9118524791, 38.1438688703))
            ThreePointArc((42.9118524791, 38.1438688703), (47.6629703853, 32.0097339825), (51.5436352082, 25.291015897))
            ThreePointArc((51.5436352082, 25.291015897), (57.4141255753, 0), (51.5436352082, -25.291015897))
            ThreePointArc((51.5436352082, -25.291015897), (47.6629703853, -32.0097339825), (42.9118524791, -38.1438688703))
            ThreePointArc((42.9118524791, -38.1438688703), (38.1001297285, -50.7296960956), (42.8188262114, -63.3506955122))
            ThreePointArc((42.8188262114, -63.3506955122), (63.854238955, -68.6313117867), (76.2, -50.7999999518))
            ThreePointArc((76.2, -50.7999999518), (74.0072893972, -41.9267652922), (67.9339324093, -35.0962010395))
            ThreePointArc((67.9339324093, -35.0962010395), (73.4862819613, -21.1312295786), (76.2, -6.35))
            Line((76.2, -6.35), (76.2, 6.35))
            ThreePointArc((76.2, 6.35), (73.4862819613, 21.1312295786), (67.9339324093, 35.0962010395))
            ThreePointArc((67.9339324093, 35.0962010395), (74.0072894084, 41.9267653135), (76.2, 50.8))
        make_face()
        with Locations((57.15, -50.8)):
            Circle(F4_R, mode=Mode.SUBTRACT)
        with Locations((57.15, 50.8)):
            Circle(F4_R, mode=Mode.SUBTRACT)
        with Locations((-57.15, 50.8)):
            Circle(F4_R)
        with Locations((-57.15, -50.8)):
            Circle(F4_R)
        with Locations((57.15, -50.8)):
            Circle(F4_R)
        with Locations((57.15, 50.8)):
            Circle(F4_R)
        with BuildLine():
            ThreePointArc((76.2, -6.35), (76.4641255753, 0), (76.2, 6.35))
            Line((76.2, 6.35), (76.2, -6.35))
        make_face()
    extrude(amount=-F5_DEPTH, mode=Mode.SUBTRACT)

    # F6 (on face) → F7 (cut)
    with BuildSketch(Plane.XY):
        with BuildLine():
            ThreePointArc((-51.5436352082, -25.291015897), (-57.4141255753, 0), (-51.5436352082, 25.291015897))
            ThreePointArc((-51.5436352082, 25.291015897), (-47.6629703853, 32.0097339825), (-42.9118524791, 38.1438688703))
            ThreePointArc((-42.9118524791, 38.1438688703), (-38.1001297285, 50.7296960956), (-42.8188262114, 63.3506955122))
            ThreePointArc((-42.8188262114, 63.3506955122), (-71.3881475209, 63.4561311297), (-67.9339324093, 35.0962010395))
            ThreePointArc((-67.9339324093, 35.0962010395), (-76.4641255753, 0), (-67.9339324093, -35.0962010395))
            ThreePointArc((-67.9339324093, -35.0962010395), (-71.3881475209, -63.4561311297), (-42.8188262114, -63.3506955122))
            ThreePointArc((-42.8188262114, -63.3506955122), (-38.1001297285, -50.7296960956), (-42.9118524791, -38.1438688703))
            ThreePointArc((-42.9118524791, -38.1438688703), (-47.6629703853, -32.0097339825), (-51.5436352082, -25.291015897))
        make_face()
        with BuildLine():
            ThreePointArc((42.8188262114, -63.3506955122), (71.3881475209, -63.4561311297), (67.9339324093, -35.0962010395))
            ThreePointArc((67.9339324093, -35.0962010395), (76.4641255753, 0), (67.9339324093, 35.0962010395))
            ThreePointArc((67.9339324093, 35.0962010395), (71.3881475209, 63.4561311297), (42.8188262114, 63.3506955122))
            ThreePointArc((42.8188262114, 63.3506955122), (38.1001297285, 50.7296960956), (42.9118524791, 38.1438688703))
            ThreePointArc((42.9118524791, 38.1438688703), (47.6629703853, 32.0097339825), (51.5436352082, 25.291015897))
            ThreePointArc((51.5436352082, 25.291015897), (57.4141255753, 0), (51.5436352082, -25.291015897))
            ThreePointArc((51.5436352082, -25.291015897), (47.6629703853, -32.0097339825), (42.9118524791, -38.1438688703))
            ThreePointArc((42.9118524791, -38.1438688703), (38.1001297285, -50.7296960956), (42.8188262114, -63.3506955122))
        make_face()
    extrude(amount=F7_DEPTH, mode=Mode.SUBTRACT)


solid = f1.part
